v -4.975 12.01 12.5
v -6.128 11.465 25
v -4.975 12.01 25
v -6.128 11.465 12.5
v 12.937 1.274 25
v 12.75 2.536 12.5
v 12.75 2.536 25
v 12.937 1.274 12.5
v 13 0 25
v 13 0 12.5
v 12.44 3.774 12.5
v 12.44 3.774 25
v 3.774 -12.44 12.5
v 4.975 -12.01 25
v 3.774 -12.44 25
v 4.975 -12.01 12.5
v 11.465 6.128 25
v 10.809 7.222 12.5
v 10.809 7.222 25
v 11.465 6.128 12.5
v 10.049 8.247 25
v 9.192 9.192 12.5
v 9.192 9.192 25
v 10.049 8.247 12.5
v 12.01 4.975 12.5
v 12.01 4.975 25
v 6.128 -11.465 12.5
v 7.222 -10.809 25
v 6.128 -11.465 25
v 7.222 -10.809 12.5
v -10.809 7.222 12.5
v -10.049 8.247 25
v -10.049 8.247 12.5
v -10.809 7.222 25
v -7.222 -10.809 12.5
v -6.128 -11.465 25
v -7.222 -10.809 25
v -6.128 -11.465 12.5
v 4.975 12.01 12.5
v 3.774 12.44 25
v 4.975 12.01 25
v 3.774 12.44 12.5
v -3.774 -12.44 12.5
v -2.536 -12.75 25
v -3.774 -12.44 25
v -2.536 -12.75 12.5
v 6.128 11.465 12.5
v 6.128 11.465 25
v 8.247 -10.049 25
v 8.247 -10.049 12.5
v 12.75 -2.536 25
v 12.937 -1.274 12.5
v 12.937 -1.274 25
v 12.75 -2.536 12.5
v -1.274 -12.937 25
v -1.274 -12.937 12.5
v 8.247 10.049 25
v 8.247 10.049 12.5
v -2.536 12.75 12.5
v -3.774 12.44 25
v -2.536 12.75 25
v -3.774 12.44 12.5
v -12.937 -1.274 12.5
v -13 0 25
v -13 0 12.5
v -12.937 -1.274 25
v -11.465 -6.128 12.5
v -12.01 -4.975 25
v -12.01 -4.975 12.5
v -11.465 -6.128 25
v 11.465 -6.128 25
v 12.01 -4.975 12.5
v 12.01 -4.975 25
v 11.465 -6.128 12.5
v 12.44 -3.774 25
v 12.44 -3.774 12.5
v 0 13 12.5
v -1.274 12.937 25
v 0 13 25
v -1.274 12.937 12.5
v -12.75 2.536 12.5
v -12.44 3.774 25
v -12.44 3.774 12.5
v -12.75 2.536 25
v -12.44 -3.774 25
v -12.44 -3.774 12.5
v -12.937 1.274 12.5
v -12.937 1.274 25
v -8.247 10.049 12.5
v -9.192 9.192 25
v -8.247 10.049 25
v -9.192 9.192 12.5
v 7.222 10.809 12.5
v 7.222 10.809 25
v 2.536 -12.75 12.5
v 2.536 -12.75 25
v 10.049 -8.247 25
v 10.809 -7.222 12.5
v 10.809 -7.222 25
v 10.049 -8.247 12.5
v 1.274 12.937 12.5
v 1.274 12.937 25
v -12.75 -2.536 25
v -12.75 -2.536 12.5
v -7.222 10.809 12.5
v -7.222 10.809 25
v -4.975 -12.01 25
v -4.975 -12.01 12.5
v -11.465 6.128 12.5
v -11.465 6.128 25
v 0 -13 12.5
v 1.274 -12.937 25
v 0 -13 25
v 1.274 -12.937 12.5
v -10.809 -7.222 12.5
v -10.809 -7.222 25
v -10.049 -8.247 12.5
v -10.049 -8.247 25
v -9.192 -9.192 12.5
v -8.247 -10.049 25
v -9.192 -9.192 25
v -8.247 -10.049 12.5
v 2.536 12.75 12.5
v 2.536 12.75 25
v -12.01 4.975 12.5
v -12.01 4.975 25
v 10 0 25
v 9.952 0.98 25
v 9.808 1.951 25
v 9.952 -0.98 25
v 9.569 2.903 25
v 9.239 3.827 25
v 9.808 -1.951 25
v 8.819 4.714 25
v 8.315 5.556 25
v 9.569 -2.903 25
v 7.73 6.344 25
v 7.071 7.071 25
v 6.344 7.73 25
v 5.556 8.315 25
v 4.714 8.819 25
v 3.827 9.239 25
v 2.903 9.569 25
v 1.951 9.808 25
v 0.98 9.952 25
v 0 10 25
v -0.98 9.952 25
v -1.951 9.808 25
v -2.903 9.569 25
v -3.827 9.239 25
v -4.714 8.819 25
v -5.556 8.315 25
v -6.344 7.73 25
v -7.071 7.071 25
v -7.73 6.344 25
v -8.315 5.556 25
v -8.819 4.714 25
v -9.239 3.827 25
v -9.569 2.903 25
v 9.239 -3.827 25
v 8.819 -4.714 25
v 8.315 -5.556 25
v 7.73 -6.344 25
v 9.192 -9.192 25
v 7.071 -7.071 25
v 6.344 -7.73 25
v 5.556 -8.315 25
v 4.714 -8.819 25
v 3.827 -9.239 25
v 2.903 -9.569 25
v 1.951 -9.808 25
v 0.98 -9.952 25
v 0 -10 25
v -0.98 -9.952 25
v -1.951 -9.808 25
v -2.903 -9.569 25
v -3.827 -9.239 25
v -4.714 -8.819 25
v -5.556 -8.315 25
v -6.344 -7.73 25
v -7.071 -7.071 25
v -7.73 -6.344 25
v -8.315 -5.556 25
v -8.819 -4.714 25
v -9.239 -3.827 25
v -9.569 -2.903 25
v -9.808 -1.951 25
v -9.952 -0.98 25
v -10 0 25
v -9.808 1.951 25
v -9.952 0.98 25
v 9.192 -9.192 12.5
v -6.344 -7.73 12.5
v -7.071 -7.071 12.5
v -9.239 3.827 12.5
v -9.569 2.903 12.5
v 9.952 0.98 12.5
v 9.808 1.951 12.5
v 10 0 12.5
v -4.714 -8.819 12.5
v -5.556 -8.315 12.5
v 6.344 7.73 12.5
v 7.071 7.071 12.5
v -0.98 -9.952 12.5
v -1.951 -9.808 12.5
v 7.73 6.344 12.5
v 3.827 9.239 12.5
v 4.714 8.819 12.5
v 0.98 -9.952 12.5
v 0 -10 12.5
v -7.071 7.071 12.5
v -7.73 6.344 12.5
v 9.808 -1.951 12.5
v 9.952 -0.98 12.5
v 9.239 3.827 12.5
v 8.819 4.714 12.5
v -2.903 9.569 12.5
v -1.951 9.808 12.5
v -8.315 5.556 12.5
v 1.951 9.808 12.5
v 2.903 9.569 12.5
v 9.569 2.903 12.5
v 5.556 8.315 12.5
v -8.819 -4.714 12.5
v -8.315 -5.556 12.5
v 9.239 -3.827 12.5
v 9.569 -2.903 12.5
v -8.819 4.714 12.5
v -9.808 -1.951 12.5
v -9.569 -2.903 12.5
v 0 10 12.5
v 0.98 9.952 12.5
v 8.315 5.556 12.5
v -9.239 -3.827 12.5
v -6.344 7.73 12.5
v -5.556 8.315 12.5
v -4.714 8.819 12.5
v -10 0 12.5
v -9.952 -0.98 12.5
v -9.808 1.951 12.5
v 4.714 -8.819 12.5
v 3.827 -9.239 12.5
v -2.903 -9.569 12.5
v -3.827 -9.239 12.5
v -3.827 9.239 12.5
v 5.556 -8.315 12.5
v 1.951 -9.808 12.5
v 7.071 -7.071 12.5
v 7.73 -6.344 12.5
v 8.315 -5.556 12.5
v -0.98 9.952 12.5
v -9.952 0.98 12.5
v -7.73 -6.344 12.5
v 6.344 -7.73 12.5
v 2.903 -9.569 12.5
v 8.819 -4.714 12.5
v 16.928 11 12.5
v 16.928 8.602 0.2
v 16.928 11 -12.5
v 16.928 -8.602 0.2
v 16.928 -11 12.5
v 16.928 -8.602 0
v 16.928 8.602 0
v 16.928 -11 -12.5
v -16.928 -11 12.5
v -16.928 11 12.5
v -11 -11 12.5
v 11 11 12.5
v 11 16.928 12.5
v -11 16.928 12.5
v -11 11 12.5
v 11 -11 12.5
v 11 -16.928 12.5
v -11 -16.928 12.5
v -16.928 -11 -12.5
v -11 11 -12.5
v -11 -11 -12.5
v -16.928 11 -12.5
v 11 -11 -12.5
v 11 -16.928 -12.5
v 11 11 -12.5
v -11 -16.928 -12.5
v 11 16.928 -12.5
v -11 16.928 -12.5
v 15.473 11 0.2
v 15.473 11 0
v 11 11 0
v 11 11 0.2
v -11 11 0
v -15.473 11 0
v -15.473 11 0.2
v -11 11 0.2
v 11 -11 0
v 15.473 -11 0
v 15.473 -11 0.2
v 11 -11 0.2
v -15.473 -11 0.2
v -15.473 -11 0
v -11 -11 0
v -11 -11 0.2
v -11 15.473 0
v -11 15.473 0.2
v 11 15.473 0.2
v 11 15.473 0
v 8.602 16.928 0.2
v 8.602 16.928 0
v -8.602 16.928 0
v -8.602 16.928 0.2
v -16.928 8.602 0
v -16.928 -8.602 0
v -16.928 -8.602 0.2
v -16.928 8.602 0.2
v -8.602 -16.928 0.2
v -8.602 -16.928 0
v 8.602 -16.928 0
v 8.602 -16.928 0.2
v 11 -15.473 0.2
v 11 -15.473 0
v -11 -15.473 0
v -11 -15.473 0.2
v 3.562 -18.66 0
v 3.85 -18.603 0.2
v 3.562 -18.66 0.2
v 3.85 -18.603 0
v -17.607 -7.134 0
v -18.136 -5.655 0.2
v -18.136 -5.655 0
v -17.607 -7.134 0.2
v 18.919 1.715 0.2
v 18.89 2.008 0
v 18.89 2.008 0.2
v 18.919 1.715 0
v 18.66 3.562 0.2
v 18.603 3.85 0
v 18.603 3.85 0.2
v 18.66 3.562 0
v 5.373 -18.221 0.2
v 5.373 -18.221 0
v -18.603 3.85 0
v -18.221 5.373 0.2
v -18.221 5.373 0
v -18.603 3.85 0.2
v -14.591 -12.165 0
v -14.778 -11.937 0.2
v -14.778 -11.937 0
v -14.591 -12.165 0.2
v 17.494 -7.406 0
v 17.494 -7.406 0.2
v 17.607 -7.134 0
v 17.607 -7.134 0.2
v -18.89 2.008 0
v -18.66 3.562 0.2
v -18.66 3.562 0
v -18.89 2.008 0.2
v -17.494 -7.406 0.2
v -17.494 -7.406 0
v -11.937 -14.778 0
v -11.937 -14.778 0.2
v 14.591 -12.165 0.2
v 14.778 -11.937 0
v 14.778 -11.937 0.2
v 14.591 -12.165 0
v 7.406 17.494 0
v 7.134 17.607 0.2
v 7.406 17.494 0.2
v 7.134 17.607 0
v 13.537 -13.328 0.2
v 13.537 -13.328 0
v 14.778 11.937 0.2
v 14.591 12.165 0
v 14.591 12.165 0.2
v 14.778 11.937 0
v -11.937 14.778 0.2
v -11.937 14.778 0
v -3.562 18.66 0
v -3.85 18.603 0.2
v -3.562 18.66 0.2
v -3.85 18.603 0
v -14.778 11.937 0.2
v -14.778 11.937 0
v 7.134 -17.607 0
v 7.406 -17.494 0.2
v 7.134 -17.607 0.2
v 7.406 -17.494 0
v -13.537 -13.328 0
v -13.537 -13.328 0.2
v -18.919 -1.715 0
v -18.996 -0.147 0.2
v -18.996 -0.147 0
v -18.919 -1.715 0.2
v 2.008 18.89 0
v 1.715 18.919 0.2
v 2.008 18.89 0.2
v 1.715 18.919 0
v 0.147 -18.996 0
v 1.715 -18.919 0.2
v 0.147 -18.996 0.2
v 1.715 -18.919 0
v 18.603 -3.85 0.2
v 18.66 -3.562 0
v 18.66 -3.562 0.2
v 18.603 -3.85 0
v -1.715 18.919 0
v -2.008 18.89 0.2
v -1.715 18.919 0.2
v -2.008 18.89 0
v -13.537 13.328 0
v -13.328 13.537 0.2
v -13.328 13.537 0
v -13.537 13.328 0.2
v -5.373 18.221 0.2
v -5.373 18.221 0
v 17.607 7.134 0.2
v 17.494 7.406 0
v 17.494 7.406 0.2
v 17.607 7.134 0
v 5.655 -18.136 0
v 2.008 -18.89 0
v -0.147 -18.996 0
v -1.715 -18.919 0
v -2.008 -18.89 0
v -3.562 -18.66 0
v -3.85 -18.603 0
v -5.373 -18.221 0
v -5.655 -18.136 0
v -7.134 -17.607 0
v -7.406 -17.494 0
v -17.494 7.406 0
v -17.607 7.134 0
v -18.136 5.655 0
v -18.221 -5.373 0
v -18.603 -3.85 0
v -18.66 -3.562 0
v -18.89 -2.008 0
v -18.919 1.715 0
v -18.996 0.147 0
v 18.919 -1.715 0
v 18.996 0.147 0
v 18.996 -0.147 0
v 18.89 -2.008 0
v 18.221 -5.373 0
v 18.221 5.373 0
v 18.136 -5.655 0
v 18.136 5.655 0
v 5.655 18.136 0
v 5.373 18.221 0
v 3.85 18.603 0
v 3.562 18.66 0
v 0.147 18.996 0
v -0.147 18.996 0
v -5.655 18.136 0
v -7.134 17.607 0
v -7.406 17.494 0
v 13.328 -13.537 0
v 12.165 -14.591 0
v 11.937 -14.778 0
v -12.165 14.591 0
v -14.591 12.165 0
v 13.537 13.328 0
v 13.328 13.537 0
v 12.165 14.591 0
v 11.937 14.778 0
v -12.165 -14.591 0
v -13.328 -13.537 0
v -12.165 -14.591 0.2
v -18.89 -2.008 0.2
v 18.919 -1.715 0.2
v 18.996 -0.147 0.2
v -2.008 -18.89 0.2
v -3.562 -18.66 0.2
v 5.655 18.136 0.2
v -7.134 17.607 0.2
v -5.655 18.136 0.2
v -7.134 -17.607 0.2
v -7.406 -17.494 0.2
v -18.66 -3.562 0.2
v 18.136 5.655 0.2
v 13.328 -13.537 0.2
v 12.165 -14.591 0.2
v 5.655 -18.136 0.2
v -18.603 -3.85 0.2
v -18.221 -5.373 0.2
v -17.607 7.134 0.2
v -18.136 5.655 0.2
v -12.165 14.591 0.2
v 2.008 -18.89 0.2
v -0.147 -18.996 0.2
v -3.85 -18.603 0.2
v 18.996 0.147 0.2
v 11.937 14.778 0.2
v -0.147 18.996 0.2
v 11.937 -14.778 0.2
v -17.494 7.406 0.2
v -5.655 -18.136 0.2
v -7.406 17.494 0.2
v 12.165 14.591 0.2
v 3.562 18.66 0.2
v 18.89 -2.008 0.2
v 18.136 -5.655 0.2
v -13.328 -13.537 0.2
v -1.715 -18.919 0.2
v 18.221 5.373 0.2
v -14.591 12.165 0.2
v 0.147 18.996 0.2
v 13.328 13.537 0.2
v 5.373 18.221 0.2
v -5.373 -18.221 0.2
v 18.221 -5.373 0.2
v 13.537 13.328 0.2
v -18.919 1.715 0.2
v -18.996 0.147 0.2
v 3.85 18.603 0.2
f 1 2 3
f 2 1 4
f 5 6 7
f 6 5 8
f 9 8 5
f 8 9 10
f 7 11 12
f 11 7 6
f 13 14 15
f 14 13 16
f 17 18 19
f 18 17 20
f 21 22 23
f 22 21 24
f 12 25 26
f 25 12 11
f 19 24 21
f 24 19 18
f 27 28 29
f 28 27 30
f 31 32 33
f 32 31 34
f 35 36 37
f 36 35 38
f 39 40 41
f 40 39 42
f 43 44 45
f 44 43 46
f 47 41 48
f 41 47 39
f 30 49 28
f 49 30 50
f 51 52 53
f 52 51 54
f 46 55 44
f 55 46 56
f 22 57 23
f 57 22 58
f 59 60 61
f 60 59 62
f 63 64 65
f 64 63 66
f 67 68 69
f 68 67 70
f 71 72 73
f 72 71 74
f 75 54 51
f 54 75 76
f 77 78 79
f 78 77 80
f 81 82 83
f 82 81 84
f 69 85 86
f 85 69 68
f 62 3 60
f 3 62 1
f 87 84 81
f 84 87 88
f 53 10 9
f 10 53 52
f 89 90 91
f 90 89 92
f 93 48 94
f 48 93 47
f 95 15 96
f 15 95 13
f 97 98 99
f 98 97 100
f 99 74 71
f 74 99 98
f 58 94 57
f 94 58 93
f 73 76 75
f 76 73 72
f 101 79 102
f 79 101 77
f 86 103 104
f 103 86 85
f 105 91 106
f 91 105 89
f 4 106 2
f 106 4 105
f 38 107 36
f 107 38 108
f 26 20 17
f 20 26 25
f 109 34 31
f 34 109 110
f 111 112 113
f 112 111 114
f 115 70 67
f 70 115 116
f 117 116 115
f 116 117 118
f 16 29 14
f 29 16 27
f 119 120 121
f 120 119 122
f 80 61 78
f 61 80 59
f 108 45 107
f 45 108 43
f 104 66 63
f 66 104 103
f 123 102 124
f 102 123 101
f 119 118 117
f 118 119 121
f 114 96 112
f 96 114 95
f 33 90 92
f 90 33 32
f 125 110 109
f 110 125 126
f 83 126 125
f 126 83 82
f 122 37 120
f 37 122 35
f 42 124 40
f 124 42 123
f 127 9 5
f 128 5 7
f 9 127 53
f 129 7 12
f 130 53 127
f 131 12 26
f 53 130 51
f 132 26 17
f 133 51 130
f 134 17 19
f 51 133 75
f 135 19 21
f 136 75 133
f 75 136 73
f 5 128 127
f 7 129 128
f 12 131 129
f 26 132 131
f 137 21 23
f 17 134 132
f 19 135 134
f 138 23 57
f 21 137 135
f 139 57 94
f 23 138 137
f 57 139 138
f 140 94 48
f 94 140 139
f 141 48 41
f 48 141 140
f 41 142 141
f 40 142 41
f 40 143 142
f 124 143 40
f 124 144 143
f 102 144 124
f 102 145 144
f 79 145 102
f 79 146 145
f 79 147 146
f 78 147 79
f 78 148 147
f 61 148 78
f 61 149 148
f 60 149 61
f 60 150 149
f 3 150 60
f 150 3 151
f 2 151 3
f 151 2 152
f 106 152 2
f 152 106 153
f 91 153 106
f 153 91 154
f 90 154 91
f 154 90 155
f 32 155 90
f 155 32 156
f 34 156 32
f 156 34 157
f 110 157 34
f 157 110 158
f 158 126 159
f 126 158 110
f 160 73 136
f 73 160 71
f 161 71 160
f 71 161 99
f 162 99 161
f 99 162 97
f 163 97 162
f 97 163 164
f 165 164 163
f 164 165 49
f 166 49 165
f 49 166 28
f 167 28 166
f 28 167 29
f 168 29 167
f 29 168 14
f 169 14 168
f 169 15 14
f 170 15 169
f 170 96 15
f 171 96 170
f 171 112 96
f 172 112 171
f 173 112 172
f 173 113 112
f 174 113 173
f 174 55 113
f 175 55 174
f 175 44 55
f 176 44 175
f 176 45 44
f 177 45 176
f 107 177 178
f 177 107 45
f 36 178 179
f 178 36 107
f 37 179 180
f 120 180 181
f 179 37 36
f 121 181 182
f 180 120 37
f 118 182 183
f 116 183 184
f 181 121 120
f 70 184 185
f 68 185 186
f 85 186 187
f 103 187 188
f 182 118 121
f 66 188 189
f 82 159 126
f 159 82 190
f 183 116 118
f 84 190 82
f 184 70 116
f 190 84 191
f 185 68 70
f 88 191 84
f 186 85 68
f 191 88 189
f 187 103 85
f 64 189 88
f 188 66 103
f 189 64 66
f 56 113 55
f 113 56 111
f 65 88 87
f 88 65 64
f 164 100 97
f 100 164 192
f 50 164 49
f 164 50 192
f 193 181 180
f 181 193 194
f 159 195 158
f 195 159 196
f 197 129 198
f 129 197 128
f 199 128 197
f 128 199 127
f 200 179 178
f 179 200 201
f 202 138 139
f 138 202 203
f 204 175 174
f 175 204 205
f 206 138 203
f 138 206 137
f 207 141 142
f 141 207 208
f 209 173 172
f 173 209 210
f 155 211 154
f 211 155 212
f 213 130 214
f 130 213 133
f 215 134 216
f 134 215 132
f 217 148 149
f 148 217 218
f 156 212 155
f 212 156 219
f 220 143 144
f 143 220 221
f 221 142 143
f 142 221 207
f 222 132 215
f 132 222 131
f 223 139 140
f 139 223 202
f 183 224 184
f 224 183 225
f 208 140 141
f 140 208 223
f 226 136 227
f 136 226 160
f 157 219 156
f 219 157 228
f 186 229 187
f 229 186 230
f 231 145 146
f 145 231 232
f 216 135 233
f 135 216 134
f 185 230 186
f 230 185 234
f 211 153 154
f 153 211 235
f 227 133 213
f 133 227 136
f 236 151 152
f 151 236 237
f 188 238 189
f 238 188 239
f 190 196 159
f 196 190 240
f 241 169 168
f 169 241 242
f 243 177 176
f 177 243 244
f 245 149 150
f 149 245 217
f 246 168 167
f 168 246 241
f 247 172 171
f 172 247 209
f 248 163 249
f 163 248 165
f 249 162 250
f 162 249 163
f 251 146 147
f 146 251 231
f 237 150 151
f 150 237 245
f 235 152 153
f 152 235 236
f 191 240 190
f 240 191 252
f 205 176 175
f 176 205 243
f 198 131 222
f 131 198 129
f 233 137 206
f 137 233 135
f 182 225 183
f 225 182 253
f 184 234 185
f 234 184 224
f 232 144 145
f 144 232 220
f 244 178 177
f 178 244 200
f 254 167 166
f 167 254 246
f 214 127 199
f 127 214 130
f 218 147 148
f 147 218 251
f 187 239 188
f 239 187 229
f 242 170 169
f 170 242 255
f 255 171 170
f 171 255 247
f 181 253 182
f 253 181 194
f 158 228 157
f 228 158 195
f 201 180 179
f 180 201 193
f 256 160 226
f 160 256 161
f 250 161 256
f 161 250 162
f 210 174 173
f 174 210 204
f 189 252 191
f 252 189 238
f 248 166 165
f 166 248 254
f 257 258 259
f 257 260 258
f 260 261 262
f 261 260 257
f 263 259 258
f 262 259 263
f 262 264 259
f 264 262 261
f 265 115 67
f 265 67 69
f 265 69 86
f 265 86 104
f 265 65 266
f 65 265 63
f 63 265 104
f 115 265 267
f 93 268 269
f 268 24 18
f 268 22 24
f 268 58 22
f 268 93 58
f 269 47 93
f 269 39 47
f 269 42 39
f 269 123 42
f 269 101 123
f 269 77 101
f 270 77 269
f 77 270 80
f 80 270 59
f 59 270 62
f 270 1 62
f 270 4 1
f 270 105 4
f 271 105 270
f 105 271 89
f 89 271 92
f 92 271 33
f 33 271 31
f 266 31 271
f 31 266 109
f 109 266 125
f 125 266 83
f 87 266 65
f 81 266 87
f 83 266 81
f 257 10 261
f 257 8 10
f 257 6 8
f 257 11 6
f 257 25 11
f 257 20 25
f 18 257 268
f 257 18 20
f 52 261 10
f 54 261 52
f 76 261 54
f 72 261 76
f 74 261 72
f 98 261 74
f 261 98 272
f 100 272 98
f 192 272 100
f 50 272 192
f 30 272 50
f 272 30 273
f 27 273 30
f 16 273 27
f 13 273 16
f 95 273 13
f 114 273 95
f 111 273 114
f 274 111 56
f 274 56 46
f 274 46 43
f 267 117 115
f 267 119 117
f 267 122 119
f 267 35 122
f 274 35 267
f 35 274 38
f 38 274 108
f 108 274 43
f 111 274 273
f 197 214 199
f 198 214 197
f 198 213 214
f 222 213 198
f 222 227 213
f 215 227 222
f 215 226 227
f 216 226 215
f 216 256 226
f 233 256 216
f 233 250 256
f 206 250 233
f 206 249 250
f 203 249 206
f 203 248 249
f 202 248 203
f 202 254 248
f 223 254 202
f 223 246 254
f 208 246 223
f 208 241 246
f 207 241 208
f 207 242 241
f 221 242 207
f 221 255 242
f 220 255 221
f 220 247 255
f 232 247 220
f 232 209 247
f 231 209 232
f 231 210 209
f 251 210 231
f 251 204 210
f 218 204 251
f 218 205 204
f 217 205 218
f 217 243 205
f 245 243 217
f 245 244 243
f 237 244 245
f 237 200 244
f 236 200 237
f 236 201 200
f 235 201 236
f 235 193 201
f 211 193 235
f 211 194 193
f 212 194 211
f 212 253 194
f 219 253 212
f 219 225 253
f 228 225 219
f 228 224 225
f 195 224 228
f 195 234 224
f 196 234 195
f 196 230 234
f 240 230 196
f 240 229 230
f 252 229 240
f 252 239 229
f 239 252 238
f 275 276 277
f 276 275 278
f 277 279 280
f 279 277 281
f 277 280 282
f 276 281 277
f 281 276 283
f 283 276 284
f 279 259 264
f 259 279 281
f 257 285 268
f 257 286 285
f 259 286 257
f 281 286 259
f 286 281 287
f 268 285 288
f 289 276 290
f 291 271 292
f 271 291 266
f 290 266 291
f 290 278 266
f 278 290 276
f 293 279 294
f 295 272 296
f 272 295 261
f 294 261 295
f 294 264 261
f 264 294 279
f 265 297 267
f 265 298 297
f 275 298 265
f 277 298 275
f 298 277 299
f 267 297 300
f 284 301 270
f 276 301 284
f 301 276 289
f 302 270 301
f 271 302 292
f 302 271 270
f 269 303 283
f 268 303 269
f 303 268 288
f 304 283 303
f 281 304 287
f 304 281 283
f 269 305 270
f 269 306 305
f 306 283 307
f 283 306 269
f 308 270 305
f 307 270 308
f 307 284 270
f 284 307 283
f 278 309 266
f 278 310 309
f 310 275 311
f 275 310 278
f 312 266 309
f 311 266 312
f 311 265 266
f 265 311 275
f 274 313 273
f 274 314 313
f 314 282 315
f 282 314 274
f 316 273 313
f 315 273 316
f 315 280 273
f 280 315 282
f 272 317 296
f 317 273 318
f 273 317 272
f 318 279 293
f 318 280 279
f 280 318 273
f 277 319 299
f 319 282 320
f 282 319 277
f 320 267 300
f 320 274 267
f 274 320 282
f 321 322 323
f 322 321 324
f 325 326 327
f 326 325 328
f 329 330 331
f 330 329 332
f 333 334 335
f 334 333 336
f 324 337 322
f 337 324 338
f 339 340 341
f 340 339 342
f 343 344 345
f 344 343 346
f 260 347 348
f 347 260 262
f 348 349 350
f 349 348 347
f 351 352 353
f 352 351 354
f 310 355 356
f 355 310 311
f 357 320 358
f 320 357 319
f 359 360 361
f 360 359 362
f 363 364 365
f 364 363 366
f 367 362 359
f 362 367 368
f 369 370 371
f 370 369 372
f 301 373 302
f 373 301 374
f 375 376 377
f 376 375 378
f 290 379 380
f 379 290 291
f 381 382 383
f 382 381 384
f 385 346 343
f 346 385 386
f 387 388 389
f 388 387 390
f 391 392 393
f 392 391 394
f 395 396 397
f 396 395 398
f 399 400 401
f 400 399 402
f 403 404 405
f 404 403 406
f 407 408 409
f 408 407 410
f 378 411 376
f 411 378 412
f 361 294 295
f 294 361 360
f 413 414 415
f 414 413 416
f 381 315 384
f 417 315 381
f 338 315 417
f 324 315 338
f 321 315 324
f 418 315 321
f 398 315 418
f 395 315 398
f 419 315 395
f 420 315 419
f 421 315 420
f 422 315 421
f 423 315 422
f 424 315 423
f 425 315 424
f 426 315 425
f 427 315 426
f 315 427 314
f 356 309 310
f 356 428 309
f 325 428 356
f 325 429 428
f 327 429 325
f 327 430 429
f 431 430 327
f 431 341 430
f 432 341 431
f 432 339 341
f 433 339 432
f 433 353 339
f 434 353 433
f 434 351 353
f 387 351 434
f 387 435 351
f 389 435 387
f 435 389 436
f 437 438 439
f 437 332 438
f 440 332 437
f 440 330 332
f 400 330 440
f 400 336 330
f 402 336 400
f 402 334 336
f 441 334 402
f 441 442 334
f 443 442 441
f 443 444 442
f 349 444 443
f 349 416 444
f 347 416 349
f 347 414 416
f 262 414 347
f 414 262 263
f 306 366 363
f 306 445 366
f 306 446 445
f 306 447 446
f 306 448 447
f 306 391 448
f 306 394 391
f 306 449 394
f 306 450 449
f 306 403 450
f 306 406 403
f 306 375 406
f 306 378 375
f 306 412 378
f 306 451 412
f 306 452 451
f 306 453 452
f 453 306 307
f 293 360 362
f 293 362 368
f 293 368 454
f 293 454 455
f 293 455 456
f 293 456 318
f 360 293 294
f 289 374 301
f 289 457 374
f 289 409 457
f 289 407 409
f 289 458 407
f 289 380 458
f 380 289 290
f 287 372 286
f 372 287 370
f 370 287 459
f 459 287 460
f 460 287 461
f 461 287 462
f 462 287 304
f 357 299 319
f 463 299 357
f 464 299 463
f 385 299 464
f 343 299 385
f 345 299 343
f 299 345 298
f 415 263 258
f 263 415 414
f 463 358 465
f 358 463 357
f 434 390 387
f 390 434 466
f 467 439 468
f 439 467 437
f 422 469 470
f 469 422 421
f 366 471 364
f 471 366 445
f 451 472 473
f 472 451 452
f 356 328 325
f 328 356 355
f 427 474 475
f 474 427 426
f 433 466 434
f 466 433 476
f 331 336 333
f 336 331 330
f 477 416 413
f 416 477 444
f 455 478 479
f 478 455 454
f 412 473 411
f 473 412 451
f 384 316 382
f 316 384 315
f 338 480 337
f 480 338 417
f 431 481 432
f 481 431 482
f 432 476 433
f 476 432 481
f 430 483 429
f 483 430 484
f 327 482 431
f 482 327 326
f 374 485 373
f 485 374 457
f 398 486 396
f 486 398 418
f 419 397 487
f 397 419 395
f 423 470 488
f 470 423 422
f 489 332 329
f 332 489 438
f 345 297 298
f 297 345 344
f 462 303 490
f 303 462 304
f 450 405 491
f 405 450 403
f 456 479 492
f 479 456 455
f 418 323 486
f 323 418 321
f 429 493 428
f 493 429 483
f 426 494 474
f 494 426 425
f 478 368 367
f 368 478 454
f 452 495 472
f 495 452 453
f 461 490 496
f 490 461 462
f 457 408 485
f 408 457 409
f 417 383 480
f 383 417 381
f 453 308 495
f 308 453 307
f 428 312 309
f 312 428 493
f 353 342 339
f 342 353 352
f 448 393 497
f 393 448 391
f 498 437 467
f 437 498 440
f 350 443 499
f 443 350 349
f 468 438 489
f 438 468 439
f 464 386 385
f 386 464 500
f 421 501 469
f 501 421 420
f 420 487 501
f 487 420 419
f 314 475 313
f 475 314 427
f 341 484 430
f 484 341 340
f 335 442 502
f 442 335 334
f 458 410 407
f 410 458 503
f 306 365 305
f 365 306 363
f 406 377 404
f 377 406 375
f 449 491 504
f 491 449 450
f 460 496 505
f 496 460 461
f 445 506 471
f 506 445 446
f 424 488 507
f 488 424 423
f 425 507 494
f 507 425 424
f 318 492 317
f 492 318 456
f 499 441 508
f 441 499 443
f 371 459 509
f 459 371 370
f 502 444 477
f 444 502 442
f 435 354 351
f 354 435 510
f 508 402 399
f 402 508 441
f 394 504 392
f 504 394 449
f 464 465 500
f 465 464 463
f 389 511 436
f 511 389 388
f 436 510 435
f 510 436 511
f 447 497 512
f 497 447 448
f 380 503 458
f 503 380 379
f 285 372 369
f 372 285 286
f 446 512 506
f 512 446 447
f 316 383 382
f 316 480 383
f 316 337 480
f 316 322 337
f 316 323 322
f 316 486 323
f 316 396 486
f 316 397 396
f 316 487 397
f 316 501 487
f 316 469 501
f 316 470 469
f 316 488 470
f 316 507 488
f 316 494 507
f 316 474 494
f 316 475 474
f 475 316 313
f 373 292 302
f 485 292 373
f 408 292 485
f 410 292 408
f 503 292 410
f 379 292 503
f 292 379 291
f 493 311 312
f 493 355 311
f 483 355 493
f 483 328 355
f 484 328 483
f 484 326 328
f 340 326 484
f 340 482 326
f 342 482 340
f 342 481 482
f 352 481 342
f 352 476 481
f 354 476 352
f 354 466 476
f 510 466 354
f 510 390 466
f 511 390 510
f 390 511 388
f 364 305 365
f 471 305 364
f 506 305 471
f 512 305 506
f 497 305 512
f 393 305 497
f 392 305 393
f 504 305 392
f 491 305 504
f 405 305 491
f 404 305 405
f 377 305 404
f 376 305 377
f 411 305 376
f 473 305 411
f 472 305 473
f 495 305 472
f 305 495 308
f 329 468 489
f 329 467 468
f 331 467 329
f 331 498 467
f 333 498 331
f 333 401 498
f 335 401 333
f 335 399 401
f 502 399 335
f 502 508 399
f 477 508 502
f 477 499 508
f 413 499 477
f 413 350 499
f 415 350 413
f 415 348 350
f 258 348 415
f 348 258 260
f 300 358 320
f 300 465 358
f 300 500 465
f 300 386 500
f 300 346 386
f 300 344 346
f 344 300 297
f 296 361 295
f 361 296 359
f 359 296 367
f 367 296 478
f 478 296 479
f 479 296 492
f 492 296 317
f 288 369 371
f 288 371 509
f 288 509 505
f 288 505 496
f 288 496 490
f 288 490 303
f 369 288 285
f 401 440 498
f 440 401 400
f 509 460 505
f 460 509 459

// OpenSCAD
// ═══════════════════════════════════════════════════════════════
// 焊头 ArUco 多面安装环 — 3D 打印参数化模型
//
// 用法：
//   1. 用游标卡尺量焊头直径，修改 WELD_TIP_DIAMETER
//   2. 用 OpenSCAD 打开此文件
//   3. 渲染 (F6) → 导出 STL (F7) → 3D 打印
//   4. 打印后把 4 个 ArUco 码（ID=0~3, 6×6_250）贴在 4 个平面上
//
// ═══════════════════════════════════════════════════════════════

// ── 用户参数 ──────────────────────────────────────────────────

/* [焊头尺寸] */
// 焊头圆柱体直径（mm）— 用游标卡尺量
WELD_TIP_DIAMETER = 20;

/* [环尺寸] */
// 环壁厚（mm）
WALL_THICKNESS = 3;
// 环高度（mm）
RING_HEIGHT = 25;
// 二维码贴纸边长（mm）— 打印 AruCo 时设为同样尺寸
MARKER_SIZE = 18;

/* [打印机设置] */
// 层高（mm）— 0.2 普通, 0.12 精细
LAYER_HEIGHT = 0.2;
// 是否加底边（提高平台附着力）
ADD_BRIM = true;

// ── 计算公式 ──────────────────────────────────────────────────

TIP_RADIUS = WELD_TIP_DIAMETER / 2;
OUTER_RADIUS = TIP_RADIUS + WALL_THICKNESS;
FLAT_WIDTH = MARKER_SIZE + 4;  // 贴纸 + 2mm 边框
// 由外径和贴纸宽度推导平面距离圆心的缩进
FLAT_INSET = sqrt(OUTER_RADIUS * OUTER_RADIUS - (FLAT_WIDTH / 2) * (FLAT_WIDTH / 2));

// ── 主模型 ────────────────────────────────────────────────────

module aruco_mount_ring() {
    difference() {
        union() {
            // 基础环
            difference() {
                cylinder(h = RING_HEIGHT, r = OUTER_RADIUS, $fn = 64);
                translate([0, 0, -0.1])
                    cylinder(h = RING_HEIGHT + 0.2, r = TIP_RADIUS, $fn = 64);
            }

            // 4 个平面的贴纸平台（凸块）
            for (angle = [0:90:270]) {
                rotate([0, 0, angle]) {
                    translate([FLAT_INSET, 0, 0]) {
                        // 凸块 — 给贴纸一个平整的矩形面
                        cube([MARKER_SIZE + 2, MARKER_SIZE + 4, RING_HEIGHT],
                             center = true);
                    }
                }
            }
        }
    }

    // ── 4 个面的 ArUco 定位标记 ──
    // 打印时可以用这些浅槽定位贴纸位置
    %for (angle = [0:90:270]) {
        rotate([0, 0, angle]) {
            translate([FLAT_INSET + 1, 0, 0]) {
                // 浅槽区域（0.4mm 深），辅助贴纸定位
                color("Gray", 0.3)
                    cube([MARKER_SIZE, MARKER_SIZE, 0.4], center = true);
            }
        }
    }
}

// ── 底边（可选）───────────────────────────────────────────────

module brim() {
    if (ADD_BRIM) {
        linear_extrude(height = LAYER_HEIGHT, convexity = 4) {
            offset(r = 3) {
                circle(r = OUTER_RADIUS + WALL_THICKNESS, $fn = 64);
            }
        }
    }
}

// ── 渲染 ──────────────────────────────────────────────────────

$fn = 64;

brim();
aruco_mount_ring();

// ═══════════════════════════════════════════════════════════════
// 打印说明
// ═══════════════════════════════════════════════════════════════
//
// 材料推荐：
//   PLA 或 PETG（普通 FDM 打印）
//   不需要支撑（因为 4 个凸块是水平延伸的）
//
// 后处理：
//   1. 打磨 4 个平面（平整贴纸）
//   2. 裁剪 4 个 ArUco 码（6×6_250, ID=0,1,2,3），尺寸 = MARKER_SIZE 对应
//   3. 用双面胶或胶水贴在 4 个平面上
//
// ArUco 码生成：
//   搜索 "ArUco marker generator"
//   选 6×6 bits, ID=0~3, size=18×18mm
//   打印后用剪刀裁剪
//
// 安装：
//   套在焊头上，紧配合（如果太松，用胶带绑一圈）
//   确保 4 个面中至少有一个朝向相机方向
//
// ═══════════════════════════════════════════════════════════════
